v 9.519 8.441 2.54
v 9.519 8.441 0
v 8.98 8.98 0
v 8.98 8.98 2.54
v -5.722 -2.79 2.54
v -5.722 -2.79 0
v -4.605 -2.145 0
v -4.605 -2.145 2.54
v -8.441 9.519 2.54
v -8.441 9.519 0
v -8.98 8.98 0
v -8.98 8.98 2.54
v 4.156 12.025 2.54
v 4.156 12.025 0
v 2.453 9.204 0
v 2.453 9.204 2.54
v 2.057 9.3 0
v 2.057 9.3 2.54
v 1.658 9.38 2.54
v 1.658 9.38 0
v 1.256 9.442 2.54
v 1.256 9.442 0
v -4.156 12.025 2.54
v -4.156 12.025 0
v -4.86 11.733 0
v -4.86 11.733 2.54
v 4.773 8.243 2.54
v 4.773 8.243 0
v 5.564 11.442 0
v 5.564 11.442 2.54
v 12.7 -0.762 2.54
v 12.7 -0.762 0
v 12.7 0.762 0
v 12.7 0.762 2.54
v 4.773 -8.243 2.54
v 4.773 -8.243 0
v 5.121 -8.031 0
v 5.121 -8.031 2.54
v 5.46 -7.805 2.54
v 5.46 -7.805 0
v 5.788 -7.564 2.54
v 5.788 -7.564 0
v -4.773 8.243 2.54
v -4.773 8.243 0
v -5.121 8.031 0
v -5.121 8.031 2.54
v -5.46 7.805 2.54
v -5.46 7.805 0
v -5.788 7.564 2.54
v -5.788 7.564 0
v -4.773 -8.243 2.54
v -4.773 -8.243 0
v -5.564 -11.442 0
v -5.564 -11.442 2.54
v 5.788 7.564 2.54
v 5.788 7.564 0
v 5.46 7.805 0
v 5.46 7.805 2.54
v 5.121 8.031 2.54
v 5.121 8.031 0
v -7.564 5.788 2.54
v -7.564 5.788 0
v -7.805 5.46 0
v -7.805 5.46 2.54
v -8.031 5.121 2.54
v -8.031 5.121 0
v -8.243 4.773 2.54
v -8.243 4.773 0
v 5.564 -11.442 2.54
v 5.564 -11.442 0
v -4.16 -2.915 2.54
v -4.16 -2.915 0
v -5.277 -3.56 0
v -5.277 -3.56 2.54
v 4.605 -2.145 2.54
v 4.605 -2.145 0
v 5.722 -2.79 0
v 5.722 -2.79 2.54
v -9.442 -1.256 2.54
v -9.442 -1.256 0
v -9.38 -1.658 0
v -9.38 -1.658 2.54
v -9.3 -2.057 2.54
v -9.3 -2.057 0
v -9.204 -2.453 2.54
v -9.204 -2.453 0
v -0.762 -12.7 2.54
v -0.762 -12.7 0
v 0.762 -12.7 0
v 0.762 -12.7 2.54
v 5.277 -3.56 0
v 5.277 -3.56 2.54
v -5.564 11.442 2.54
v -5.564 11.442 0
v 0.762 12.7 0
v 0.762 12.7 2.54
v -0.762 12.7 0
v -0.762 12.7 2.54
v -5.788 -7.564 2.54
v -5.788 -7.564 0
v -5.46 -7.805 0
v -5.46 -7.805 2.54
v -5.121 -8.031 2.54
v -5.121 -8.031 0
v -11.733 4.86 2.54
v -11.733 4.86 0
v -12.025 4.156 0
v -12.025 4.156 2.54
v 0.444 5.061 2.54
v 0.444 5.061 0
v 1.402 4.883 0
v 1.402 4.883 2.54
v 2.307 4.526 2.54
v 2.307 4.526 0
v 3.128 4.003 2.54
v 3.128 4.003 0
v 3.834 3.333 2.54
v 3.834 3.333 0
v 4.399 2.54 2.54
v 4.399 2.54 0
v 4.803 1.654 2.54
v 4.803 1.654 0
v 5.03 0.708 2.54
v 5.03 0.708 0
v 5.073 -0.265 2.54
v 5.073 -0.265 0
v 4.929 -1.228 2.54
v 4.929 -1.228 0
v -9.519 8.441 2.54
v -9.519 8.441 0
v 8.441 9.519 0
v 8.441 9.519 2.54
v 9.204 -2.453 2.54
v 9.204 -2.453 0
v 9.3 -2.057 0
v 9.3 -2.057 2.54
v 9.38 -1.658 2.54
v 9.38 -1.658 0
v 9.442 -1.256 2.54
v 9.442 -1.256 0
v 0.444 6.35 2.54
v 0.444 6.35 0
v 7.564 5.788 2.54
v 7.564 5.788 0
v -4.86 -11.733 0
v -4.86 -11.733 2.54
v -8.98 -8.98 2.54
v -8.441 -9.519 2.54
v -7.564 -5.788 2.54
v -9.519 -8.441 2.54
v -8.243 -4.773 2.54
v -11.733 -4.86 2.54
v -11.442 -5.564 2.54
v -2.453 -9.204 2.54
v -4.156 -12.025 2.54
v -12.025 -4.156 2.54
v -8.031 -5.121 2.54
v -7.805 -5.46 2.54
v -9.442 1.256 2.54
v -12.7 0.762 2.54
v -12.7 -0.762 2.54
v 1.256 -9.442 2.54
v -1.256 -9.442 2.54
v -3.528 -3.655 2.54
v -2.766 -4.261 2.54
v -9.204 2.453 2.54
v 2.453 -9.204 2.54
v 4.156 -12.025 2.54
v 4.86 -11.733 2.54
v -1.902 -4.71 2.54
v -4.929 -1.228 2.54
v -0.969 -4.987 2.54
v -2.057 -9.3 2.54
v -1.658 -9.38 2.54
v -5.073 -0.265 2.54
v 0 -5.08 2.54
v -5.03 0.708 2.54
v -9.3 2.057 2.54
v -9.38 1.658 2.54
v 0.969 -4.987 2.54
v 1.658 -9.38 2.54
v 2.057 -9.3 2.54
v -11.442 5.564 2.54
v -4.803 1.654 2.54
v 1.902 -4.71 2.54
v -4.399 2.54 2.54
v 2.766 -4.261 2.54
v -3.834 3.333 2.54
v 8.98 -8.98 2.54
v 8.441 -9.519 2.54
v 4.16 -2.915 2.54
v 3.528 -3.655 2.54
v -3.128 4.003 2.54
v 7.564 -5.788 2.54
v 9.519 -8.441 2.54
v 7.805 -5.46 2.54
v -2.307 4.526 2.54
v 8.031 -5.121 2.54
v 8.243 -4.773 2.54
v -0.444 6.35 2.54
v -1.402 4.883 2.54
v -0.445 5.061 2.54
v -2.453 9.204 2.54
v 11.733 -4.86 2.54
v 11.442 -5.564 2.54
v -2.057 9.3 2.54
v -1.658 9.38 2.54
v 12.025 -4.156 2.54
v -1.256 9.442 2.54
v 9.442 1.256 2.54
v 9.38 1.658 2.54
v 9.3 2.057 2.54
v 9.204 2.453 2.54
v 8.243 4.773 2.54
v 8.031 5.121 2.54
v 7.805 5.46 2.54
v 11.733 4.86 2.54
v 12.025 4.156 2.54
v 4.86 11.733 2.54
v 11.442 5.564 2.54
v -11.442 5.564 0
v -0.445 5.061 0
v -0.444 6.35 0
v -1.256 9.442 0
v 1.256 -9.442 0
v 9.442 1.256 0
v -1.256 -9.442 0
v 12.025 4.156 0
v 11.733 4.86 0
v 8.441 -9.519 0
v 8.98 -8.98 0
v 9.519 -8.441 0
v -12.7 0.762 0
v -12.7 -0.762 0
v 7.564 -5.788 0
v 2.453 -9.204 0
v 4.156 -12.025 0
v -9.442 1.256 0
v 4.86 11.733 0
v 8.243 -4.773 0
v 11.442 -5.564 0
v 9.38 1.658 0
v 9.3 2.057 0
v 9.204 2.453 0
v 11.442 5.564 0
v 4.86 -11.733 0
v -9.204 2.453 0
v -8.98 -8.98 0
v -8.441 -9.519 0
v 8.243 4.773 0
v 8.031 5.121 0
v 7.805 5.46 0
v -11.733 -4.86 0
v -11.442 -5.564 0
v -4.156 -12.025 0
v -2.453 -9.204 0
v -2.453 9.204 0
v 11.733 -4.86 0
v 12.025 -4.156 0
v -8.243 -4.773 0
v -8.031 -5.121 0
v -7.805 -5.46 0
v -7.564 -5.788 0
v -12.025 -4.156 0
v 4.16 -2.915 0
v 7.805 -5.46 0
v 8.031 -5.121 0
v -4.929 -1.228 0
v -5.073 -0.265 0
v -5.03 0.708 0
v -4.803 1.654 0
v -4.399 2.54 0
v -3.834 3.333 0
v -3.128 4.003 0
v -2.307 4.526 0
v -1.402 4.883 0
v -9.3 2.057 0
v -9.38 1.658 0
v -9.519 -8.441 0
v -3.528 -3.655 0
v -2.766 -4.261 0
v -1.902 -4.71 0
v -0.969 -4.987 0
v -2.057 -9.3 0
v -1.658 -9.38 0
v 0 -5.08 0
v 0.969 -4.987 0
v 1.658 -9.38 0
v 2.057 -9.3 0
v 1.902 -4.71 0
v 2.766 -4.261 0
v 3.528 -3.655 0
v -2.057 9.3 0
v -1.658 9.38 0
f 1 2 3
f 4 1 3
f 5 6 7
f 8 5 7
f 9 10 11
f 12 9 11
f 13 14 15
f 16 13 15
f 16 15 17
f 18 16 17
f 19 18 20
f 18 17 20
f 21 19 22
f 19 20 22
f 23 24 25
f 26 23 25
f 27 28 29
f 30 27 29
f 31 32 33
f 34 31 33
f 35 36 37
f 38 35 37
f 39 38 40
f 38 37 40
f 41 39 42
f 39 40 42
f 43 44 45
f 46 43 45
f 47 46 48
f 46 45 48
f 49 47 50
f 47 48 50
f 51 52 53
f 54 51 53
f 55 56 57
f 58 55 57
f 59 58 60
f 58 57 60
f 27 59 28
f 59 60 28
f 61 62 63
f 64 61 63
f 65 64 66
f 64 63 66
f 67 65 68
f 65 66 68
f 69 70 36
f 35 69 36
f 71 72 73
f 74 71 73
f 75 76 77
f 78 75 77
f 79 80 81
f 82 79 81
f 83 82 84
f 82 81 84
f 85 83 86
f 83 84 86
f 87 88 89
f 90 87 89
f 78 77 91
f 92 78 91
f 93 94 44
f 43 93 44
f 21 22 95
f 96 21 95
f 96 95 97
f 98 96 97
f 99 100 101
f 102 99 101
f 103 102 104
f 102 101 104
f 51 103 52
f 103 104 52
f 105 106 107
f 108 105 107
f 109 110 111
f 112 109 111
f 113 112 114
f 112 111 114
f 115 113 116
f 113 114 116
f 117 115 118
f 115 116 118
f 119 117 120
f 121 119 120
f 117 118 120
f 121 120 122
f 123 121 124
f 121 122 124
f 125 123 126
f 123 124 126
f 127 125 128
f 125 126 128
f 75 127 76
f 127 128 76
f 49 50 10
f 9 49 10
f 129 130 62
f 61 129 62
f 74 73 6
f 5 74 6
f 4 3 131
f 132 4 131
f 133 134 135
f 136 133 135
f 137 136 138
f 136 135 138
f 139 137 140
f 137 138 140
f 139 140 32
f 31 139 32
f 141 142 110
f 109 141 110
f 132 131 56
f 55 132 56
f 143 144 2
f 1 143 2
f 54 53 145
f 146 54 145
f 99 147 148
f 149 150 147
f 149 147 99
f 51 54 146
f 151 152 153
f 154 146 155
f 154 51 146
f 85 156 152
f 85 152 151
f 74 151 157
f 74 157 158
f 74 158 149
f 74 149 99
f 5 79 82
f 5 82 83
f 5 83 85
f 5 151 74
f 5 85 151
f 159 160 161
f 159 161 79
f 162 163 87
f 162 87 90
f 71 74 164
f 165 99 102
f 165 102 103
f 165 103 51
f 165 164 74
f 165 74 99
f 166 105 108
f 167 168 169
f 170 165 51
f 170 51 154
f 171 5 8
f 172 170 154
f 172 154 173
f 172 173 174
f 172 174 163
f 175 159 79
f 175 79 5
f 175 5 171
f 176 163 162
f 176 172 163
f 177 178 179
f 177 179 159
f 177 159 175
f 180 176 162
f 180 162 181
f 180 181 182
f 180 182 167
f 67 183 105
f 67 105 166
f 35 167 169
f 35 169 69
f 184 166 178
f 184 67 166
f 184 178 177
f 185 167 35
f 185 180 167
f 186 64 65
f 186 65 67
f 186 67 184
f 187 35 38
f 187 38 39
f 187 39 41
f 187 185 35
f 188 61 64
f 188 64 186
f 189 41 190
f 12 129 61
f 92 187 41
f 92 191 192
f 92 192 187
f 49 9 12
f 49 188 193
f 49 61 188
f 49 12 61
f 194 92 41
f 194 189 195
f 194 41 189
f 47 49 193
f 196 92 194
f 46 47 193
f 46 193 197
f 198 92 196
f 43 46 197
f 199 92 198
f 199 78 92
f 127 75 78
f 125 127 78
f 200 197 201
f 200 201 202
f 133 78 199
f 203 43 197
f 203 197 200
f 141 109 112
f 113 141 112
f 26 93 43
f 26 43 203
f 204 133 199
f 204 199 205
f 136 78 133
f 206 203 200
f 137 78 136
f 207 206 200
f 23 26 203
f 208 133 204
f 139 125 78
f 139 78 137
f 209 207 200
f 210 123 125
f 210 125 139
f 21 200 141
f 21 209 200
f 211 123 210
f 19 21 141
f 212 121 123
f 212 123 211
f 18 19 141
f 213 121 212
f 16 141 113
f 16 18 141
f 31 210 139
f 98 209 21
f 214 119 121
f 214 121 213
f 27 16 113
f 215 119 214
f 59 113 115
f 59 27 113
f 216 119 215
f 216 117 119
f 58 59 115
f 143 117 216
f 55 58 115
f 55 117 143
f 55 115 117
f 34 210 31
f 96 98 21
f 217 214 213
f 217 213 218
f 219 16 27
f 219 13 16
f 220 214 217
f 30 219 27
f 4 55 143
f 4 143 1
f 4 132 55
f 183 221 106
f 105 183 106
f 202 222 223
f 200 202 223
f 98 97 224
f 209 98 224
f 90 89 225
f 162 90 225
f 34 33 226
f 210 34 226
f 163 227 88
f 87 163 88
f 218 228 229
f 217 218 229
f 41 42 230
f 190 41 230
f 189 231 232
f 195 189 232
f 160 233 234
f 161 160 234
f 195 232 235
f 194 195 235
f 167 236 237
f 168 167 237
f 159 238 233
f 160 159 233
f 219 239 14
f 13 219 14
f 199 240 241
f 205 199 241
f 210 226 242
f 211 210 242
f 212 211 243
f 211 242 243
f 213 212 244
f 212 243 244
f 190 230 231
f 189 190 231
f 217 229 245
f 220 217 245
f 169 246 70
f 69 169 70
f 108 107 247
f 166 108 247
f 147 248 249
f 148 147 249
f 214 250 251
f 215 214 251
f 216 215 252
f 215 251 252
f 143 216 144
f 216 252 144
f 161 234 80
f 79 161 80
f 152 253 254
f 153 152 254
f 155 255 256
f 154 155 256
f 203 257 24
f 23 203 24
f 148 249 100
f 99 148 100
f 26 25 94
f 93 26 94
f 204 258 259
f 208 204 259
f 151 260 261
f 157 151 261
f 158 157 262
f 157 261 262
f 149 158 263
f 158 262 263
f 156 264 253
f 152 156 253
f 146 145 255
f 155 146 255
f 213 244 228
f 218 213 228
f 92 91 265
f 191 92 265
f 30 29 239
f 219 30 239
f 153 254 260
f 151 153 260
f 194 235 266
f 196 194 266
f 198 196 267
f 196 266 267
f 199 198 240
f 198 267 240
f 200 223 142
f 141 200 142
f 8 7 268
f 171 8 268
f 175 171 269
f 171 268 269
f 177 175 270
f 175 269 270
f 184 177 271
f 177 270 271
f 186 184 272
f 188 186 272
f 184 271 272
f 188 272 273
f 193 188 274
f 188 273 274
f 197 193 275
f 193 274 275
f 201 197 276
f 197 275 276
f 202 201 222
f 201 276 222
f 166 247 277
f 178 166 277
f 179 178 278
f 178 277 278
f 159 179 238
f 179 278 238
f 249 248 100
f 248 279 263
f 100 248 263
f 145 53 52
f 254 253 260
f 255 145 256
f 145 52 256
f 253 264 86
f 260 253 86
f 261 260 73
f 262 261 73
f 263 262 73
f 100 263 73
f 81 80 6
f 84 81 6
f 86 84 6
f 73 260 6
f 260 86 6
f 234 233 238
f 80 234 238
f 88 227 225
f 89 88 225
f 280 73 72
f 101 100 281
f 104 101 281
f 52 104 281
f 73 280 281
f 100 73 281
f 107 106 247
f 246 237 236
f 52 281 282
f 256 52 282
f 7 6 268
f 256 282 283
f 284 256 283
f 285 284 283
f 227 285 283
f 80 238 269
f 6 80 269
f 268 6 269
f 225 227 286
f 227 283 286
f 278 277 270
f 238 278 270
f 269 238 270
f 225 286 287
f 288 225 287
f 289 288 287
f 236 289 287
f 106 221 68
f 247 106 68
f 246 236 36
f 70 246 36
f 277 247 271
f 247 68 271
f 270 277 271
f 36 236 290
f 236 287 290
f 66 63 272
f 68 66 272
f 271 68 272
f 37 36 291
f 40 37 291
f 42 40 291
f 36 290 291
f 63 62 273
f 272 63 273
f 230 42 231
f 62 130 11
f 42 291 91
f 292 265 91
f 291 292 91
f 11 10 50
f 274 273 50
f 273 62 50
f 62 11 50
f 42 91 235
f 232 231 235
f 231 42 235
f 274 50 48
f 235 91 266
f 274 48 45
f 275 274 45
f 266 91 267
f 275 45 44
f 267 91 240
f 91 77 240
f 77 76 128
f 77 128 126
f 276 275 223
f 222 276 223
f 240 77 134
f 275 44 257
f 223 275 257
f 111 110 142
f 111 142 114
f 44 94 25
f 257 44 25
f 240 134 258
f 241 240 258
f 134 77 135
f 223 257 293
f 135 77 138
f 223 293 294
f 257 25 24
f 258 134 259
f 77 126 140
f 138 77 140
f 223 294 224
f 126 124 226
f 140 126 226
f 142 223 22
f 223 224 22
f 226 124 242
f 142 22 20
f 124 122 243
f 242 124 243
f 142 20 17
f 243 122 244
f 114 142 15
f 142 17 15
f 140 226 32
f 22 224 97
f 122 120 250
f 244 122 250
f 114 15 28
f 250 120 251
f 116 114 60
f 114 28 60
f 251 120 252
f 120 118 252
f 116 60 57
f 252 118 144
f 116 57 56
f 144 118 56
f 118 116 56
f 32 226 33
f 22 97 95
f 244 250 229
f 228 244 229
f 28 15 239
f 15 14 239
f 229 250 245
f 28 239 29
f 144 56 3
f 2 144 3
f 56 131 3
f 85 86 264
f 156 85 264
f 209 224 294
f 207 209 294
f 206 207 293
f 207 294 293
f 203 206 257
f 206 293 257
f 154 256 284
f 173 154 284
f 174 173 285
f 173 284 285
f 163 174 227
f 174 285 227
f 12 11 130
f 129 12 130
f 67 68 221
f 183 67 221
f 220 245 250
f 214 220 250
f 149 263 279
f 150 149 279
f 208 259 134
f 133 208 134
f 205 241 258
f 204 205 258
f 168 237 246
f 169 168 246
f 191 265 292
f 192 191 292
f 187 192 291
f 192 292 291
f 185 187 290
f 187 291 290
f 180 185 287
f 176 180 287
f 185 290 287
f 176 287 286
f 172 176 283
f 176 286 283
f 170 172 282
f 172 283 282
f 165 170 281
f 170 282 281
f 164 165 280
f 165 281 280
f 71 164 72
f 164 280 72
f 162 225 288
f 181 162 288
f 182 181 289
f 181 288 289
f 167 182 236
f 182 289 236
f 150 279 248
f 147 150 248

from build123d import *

# Parameters (mm, degrees)
F1_DEPTH = 2.54


with BuildPart() as f1:
    # F0 (on Top) → F1 (new body)
    with BuildSketch(Plane.XY):
        with BuildLine():
            Line((-9.5190714883, 8.4414407538), (-7.564357968, 5.788446556))
            ThreePointArc((-7.564357968, 5.788446556), (-7.9197480572, 5.2918064695), (-8.242581769, 4.7734129071))
            Line((-8.242581769, 4.7734129071), (-11.4416652874, 5.5640757948))
            Line((-11.4416652874, 5.5640757948), (-11.7332700629, 4.860079591))
            Line((-11.7332700629, 4.860079591), (-12.0248748384, 4.1560833873))
            Line((-12.0248748384, 4.1560833873), (-9.2036980994, 2.4530728273))
            ThreePointArc((-9.2036980994, 2.4530728273), (-9.3419797958, 1.8582353172), (-9.4418586268, 1.2557590022))
            Line((-9.4418586268, 1.2557590022), (-12.7, 0.762))
            Line((-12.7, 0.762), (-12.7, 0))
            Line((-12.7, 0), (-12.7, -0.762))
            Line((-12.7, -0.762), (-9.4418586268, -1.2557590022))
            ThreePointArc((-9.4418586268, -1.2557590022), (-9.3419797958, -1.8582353172), (-9.2036980994, -2.4530728273))
            Line((-9.2036980994, -2.4530728273), (-12.0248748384, -4.1560833873))
            Line((-12.0248748384, -4.1560833873), (-11.7332700629, -4.860079591))
            Line((-11.7332700629, -4.860079591), (-11.4416652874, -5.5640757948))
            Line((-11.4416652874, -5.5640757948), (-8.242581769, -4.7734129071))
            ThreePointArc((-8.242581769, -4.7734129071), (-7.9197480572, -5.2918064695), (-7.564357968, -5.788446556))
            Line((-7.564357968, -5.788446556), (-9.5190714883, -8.4414407538))
            Line((-9.5190714883, -8.4414407538), (-8.9802561211, -8.9802561211))
            Line((-8.9802561211, -8.9802561211), (-8.4414407538, -9.5190714883))
            Line((-8.4414407538, -9.5190714883), (-5.788446556, -7.564357968))
            ThreePointArc((-5.788446556, -7.564357968), (-5.2918064695, -7.9197480572), (-4.7734129071, -8.242581769))
            Line((-4.7734129071, -8.242581769), (-5.5640757948, -11.4416652874))
            Line((-5.5640757948, -11.4416652874), (-4.860079591, -11.7332700629))
            Line((-4.860079591, -11.7332700629), (-4.1560833873, -12.0248748384))
            Line((-4.1560833873, -12.0248748384), (-2.4530728273, -9.2036980994))
            ThreePointArc((-2.4530728273, -9.2036980994), (-1.8582353172, -9.3419797958), (-1.2557590022, -9.4418586268))
            Line((-1.2557590022, -9.4418586268), (-0.762, -12.7))
            Line((-0.762, -12.7), (0, -12.7))
            Line((0, -12.7), (0.762, -12.7))
            Line((0.762, -12.7), (1.2557590022, -9.4418586268))
            ThreePointArc((1.2557590022, -9.4418586268), (1.8582353172, -9.3419797958), (2.4530728273, -9.2036980994))
            Line((2.4530728273, -9.2036980994), (4.1560833873, -12.0248748384))
            Line((4.1560833873, -12.0248748384), (4.860079591, -11.7332700629))
            Line((4.860079591, -11.7332700629), (5.5640757948, -11.4416652874))
            Line((5.5640757948, -11.4416652874), (4.7734129071, -8.242581769))
            ThreePointArc((4.7734129071, -8.242581769), (5.2918064695, -7.9197480572), (5.788446556, -7.564357968))
            Line((5.788446556, -7.564357968), (8.4414407538, -9.5190714883))
            Line((8.4414407538, -9.5190714883), (8.9802561211, -8.9802561211))
            Line((8.9802561211, -8.9802561211), (9.5190714883, -8.4414407538))
            Line((9.5190714883, -8.4414407538), (7.564357968, -5.788446556))
            ThreePointArc((7.564357968, -5.788446556), (7.9197480572, -5.2918064695), (8.242581769, -4.7734129071))
            Line((8.242581769, -4.7734129071), (11.4416652874, -5.5640757948))
            Line((11.4416652874, -5.5640757948), (11.7332700629, -4.860079591))
            Line((11.7332700629, -4.860079591), (12.0248748384, -4.1560833873))
            Line((12.0248748384, -4.1560833873), (9.2036980994, -2.4530728273))
            ThreePointArc((9.2036980994, -2.4530728273), (9.3419797958, -1.8582353172), (9.4418586268, -1.2557590022))
            Line((9.4418586268, -1.2557590022), (12.7, -0.762))
            Line((12.7, -0.762), (12.7, 0))
            Line((12.7, 0), (12.7, 0.762))
            Line((12.7, 0.762), (9.4418586268, 1.2557590022))
            ThreePointArc((9.4418586268, 1.2557590022), (9.3419797958, 1.8582353172), (9.2036980994, 2.4530728273))
            Line((9.2036980994, 2.4530728273), (12.0248748384, 4.1560833873))
            Line((12.0248748384, 4.1560833873), (11.7332700629, 4.860079591))
            Line((11.7332700629, 4.860079591), (11.4416652874, 5.5640757948))
            Line((11.4416652874, 5.5640757948), (8.242581769, 4.7734129071))
            ThreePointArc((8.242581769, 4.7734129071), (7.9197480572, 5.2918064695), (7.564357968, 5.788446556))
            Line((7.564357968, 5.788446556), (9.5190714883, 8.4414407538))
            Line((9.5190714883, 8.4414407538), (8.9802561211, 8.9802561211))
            Line((8.9802561211, 8.9802561211), (8.4414407538, 9.5190714883))
            Line((8.4414407538, 9.5190714883), (5.788446556, 7.564357968))
            ThreePointArc((5.788446556, 7.564357968), (5.2918064695, 7.9197480572), (4.7734129071, 8.242581769))
            Line((4.7734129071, 8.242581769), (5.5640757948, 11.4416652874))
            Line((5.5640757948, 11.4416652874), (4.860079591, 11.7332700629))
            Line((4.860079591, 11.7332700629), (4.1560833873, 12.0248748384))
            Line((4.1560833873, 12.0248748384), (2.4530728273, 9.2036980994))
            ThreePointArc((2.4530728273, 9.2036980994), (1.8582353172, 9.3419797958), (1.2557590022, 9.4418586268))
            Line((1.2557590022, 9.4418586268), (0.762, 12.7))
            Line((0.762, 12.7), (0, 12.7))
            Line((0, 12.7), (-0.762, 12.7))
            Line((-0.762, 12.7), (-1.2557590022, 9.4418586268))
            ThreePointArc((-1.2557590022, 9.4418586268), (-1.8582353172, 9.3419797958), (-2.4530728273, 9.2036980994))
            Line((-2.4530728273, 9.2036980994), (-4.1560833873, 12.0248748384))
            Line((-4.1560833873, 12.0248748384), (-4.860079591, 11.7332700629))
            Line((-4.860079591, 11.7332700629), (-5.5640757948, 11.4416652874))
            Line((-5.5640757948, 11.4416652874), (-4.7734129071, 8.242581769))
            ThreePointArc((-4.7734129071, 8.242581769), (-5.2918064695, 7.9197480572), (-5.788446556, 7.564357968))
            Line((-5.788446556, 7.564357968), (-8.4414407538, 9.5190714883))
            Line((-8.4414407538, 9.5190714883), (-8.9802561211, 8.9802561211))
            Line((-8.9802561211, 8.9802561211), (-9.5190714883, 8.4414407538))
        make_face()
        with BuildLine():
            ThreePointArc((-4.6047852038, -2.1453095877), (-4.3994090512, 2.54), (-0.4445, 5.0605157593))
            Line((-0.4445, 5.0605157593), (-0.4445, 6.35))
            Line((-0.4445, 6.35), (0, 6.35))
            Line((0, 6.35), (0.4445, 6.35))
            Line((0.4445, 6.35), (0.4445, 5.0605157593))
            ThreePointArc((0.4445, 5.0605157593), (4.3994090512, 2.54), (4.6047852038, -2.1453095877))
            Line((4.6047852038, -2.1453095877), (5.721511314, -2.790051708))
            Line((5.721511314, -2.790051708), (5.277011314, -3.559948292))
            Line((5.277011314, -3.559948292), (4.1602852038, -2.9152061716))
            ThreePointArc((4.1602852038, -2.9152061716), (0, -5.08), (-4.1602852038, -2.9152061716))
            Line((-4.1602852038, -2.9152061716), (-5.277011314, -3.559948292))
            Line((-5.277011314, -3.559948292), (-5.721511314, -2.790051708))
            Line((-5.721511314, -2.790051708), (-4.6047852038, -2.1453095877))
        make_face(mode=Mode.SUBTRACT)
    extrude(amount=F1_DEPTH)


solid = f1.part
